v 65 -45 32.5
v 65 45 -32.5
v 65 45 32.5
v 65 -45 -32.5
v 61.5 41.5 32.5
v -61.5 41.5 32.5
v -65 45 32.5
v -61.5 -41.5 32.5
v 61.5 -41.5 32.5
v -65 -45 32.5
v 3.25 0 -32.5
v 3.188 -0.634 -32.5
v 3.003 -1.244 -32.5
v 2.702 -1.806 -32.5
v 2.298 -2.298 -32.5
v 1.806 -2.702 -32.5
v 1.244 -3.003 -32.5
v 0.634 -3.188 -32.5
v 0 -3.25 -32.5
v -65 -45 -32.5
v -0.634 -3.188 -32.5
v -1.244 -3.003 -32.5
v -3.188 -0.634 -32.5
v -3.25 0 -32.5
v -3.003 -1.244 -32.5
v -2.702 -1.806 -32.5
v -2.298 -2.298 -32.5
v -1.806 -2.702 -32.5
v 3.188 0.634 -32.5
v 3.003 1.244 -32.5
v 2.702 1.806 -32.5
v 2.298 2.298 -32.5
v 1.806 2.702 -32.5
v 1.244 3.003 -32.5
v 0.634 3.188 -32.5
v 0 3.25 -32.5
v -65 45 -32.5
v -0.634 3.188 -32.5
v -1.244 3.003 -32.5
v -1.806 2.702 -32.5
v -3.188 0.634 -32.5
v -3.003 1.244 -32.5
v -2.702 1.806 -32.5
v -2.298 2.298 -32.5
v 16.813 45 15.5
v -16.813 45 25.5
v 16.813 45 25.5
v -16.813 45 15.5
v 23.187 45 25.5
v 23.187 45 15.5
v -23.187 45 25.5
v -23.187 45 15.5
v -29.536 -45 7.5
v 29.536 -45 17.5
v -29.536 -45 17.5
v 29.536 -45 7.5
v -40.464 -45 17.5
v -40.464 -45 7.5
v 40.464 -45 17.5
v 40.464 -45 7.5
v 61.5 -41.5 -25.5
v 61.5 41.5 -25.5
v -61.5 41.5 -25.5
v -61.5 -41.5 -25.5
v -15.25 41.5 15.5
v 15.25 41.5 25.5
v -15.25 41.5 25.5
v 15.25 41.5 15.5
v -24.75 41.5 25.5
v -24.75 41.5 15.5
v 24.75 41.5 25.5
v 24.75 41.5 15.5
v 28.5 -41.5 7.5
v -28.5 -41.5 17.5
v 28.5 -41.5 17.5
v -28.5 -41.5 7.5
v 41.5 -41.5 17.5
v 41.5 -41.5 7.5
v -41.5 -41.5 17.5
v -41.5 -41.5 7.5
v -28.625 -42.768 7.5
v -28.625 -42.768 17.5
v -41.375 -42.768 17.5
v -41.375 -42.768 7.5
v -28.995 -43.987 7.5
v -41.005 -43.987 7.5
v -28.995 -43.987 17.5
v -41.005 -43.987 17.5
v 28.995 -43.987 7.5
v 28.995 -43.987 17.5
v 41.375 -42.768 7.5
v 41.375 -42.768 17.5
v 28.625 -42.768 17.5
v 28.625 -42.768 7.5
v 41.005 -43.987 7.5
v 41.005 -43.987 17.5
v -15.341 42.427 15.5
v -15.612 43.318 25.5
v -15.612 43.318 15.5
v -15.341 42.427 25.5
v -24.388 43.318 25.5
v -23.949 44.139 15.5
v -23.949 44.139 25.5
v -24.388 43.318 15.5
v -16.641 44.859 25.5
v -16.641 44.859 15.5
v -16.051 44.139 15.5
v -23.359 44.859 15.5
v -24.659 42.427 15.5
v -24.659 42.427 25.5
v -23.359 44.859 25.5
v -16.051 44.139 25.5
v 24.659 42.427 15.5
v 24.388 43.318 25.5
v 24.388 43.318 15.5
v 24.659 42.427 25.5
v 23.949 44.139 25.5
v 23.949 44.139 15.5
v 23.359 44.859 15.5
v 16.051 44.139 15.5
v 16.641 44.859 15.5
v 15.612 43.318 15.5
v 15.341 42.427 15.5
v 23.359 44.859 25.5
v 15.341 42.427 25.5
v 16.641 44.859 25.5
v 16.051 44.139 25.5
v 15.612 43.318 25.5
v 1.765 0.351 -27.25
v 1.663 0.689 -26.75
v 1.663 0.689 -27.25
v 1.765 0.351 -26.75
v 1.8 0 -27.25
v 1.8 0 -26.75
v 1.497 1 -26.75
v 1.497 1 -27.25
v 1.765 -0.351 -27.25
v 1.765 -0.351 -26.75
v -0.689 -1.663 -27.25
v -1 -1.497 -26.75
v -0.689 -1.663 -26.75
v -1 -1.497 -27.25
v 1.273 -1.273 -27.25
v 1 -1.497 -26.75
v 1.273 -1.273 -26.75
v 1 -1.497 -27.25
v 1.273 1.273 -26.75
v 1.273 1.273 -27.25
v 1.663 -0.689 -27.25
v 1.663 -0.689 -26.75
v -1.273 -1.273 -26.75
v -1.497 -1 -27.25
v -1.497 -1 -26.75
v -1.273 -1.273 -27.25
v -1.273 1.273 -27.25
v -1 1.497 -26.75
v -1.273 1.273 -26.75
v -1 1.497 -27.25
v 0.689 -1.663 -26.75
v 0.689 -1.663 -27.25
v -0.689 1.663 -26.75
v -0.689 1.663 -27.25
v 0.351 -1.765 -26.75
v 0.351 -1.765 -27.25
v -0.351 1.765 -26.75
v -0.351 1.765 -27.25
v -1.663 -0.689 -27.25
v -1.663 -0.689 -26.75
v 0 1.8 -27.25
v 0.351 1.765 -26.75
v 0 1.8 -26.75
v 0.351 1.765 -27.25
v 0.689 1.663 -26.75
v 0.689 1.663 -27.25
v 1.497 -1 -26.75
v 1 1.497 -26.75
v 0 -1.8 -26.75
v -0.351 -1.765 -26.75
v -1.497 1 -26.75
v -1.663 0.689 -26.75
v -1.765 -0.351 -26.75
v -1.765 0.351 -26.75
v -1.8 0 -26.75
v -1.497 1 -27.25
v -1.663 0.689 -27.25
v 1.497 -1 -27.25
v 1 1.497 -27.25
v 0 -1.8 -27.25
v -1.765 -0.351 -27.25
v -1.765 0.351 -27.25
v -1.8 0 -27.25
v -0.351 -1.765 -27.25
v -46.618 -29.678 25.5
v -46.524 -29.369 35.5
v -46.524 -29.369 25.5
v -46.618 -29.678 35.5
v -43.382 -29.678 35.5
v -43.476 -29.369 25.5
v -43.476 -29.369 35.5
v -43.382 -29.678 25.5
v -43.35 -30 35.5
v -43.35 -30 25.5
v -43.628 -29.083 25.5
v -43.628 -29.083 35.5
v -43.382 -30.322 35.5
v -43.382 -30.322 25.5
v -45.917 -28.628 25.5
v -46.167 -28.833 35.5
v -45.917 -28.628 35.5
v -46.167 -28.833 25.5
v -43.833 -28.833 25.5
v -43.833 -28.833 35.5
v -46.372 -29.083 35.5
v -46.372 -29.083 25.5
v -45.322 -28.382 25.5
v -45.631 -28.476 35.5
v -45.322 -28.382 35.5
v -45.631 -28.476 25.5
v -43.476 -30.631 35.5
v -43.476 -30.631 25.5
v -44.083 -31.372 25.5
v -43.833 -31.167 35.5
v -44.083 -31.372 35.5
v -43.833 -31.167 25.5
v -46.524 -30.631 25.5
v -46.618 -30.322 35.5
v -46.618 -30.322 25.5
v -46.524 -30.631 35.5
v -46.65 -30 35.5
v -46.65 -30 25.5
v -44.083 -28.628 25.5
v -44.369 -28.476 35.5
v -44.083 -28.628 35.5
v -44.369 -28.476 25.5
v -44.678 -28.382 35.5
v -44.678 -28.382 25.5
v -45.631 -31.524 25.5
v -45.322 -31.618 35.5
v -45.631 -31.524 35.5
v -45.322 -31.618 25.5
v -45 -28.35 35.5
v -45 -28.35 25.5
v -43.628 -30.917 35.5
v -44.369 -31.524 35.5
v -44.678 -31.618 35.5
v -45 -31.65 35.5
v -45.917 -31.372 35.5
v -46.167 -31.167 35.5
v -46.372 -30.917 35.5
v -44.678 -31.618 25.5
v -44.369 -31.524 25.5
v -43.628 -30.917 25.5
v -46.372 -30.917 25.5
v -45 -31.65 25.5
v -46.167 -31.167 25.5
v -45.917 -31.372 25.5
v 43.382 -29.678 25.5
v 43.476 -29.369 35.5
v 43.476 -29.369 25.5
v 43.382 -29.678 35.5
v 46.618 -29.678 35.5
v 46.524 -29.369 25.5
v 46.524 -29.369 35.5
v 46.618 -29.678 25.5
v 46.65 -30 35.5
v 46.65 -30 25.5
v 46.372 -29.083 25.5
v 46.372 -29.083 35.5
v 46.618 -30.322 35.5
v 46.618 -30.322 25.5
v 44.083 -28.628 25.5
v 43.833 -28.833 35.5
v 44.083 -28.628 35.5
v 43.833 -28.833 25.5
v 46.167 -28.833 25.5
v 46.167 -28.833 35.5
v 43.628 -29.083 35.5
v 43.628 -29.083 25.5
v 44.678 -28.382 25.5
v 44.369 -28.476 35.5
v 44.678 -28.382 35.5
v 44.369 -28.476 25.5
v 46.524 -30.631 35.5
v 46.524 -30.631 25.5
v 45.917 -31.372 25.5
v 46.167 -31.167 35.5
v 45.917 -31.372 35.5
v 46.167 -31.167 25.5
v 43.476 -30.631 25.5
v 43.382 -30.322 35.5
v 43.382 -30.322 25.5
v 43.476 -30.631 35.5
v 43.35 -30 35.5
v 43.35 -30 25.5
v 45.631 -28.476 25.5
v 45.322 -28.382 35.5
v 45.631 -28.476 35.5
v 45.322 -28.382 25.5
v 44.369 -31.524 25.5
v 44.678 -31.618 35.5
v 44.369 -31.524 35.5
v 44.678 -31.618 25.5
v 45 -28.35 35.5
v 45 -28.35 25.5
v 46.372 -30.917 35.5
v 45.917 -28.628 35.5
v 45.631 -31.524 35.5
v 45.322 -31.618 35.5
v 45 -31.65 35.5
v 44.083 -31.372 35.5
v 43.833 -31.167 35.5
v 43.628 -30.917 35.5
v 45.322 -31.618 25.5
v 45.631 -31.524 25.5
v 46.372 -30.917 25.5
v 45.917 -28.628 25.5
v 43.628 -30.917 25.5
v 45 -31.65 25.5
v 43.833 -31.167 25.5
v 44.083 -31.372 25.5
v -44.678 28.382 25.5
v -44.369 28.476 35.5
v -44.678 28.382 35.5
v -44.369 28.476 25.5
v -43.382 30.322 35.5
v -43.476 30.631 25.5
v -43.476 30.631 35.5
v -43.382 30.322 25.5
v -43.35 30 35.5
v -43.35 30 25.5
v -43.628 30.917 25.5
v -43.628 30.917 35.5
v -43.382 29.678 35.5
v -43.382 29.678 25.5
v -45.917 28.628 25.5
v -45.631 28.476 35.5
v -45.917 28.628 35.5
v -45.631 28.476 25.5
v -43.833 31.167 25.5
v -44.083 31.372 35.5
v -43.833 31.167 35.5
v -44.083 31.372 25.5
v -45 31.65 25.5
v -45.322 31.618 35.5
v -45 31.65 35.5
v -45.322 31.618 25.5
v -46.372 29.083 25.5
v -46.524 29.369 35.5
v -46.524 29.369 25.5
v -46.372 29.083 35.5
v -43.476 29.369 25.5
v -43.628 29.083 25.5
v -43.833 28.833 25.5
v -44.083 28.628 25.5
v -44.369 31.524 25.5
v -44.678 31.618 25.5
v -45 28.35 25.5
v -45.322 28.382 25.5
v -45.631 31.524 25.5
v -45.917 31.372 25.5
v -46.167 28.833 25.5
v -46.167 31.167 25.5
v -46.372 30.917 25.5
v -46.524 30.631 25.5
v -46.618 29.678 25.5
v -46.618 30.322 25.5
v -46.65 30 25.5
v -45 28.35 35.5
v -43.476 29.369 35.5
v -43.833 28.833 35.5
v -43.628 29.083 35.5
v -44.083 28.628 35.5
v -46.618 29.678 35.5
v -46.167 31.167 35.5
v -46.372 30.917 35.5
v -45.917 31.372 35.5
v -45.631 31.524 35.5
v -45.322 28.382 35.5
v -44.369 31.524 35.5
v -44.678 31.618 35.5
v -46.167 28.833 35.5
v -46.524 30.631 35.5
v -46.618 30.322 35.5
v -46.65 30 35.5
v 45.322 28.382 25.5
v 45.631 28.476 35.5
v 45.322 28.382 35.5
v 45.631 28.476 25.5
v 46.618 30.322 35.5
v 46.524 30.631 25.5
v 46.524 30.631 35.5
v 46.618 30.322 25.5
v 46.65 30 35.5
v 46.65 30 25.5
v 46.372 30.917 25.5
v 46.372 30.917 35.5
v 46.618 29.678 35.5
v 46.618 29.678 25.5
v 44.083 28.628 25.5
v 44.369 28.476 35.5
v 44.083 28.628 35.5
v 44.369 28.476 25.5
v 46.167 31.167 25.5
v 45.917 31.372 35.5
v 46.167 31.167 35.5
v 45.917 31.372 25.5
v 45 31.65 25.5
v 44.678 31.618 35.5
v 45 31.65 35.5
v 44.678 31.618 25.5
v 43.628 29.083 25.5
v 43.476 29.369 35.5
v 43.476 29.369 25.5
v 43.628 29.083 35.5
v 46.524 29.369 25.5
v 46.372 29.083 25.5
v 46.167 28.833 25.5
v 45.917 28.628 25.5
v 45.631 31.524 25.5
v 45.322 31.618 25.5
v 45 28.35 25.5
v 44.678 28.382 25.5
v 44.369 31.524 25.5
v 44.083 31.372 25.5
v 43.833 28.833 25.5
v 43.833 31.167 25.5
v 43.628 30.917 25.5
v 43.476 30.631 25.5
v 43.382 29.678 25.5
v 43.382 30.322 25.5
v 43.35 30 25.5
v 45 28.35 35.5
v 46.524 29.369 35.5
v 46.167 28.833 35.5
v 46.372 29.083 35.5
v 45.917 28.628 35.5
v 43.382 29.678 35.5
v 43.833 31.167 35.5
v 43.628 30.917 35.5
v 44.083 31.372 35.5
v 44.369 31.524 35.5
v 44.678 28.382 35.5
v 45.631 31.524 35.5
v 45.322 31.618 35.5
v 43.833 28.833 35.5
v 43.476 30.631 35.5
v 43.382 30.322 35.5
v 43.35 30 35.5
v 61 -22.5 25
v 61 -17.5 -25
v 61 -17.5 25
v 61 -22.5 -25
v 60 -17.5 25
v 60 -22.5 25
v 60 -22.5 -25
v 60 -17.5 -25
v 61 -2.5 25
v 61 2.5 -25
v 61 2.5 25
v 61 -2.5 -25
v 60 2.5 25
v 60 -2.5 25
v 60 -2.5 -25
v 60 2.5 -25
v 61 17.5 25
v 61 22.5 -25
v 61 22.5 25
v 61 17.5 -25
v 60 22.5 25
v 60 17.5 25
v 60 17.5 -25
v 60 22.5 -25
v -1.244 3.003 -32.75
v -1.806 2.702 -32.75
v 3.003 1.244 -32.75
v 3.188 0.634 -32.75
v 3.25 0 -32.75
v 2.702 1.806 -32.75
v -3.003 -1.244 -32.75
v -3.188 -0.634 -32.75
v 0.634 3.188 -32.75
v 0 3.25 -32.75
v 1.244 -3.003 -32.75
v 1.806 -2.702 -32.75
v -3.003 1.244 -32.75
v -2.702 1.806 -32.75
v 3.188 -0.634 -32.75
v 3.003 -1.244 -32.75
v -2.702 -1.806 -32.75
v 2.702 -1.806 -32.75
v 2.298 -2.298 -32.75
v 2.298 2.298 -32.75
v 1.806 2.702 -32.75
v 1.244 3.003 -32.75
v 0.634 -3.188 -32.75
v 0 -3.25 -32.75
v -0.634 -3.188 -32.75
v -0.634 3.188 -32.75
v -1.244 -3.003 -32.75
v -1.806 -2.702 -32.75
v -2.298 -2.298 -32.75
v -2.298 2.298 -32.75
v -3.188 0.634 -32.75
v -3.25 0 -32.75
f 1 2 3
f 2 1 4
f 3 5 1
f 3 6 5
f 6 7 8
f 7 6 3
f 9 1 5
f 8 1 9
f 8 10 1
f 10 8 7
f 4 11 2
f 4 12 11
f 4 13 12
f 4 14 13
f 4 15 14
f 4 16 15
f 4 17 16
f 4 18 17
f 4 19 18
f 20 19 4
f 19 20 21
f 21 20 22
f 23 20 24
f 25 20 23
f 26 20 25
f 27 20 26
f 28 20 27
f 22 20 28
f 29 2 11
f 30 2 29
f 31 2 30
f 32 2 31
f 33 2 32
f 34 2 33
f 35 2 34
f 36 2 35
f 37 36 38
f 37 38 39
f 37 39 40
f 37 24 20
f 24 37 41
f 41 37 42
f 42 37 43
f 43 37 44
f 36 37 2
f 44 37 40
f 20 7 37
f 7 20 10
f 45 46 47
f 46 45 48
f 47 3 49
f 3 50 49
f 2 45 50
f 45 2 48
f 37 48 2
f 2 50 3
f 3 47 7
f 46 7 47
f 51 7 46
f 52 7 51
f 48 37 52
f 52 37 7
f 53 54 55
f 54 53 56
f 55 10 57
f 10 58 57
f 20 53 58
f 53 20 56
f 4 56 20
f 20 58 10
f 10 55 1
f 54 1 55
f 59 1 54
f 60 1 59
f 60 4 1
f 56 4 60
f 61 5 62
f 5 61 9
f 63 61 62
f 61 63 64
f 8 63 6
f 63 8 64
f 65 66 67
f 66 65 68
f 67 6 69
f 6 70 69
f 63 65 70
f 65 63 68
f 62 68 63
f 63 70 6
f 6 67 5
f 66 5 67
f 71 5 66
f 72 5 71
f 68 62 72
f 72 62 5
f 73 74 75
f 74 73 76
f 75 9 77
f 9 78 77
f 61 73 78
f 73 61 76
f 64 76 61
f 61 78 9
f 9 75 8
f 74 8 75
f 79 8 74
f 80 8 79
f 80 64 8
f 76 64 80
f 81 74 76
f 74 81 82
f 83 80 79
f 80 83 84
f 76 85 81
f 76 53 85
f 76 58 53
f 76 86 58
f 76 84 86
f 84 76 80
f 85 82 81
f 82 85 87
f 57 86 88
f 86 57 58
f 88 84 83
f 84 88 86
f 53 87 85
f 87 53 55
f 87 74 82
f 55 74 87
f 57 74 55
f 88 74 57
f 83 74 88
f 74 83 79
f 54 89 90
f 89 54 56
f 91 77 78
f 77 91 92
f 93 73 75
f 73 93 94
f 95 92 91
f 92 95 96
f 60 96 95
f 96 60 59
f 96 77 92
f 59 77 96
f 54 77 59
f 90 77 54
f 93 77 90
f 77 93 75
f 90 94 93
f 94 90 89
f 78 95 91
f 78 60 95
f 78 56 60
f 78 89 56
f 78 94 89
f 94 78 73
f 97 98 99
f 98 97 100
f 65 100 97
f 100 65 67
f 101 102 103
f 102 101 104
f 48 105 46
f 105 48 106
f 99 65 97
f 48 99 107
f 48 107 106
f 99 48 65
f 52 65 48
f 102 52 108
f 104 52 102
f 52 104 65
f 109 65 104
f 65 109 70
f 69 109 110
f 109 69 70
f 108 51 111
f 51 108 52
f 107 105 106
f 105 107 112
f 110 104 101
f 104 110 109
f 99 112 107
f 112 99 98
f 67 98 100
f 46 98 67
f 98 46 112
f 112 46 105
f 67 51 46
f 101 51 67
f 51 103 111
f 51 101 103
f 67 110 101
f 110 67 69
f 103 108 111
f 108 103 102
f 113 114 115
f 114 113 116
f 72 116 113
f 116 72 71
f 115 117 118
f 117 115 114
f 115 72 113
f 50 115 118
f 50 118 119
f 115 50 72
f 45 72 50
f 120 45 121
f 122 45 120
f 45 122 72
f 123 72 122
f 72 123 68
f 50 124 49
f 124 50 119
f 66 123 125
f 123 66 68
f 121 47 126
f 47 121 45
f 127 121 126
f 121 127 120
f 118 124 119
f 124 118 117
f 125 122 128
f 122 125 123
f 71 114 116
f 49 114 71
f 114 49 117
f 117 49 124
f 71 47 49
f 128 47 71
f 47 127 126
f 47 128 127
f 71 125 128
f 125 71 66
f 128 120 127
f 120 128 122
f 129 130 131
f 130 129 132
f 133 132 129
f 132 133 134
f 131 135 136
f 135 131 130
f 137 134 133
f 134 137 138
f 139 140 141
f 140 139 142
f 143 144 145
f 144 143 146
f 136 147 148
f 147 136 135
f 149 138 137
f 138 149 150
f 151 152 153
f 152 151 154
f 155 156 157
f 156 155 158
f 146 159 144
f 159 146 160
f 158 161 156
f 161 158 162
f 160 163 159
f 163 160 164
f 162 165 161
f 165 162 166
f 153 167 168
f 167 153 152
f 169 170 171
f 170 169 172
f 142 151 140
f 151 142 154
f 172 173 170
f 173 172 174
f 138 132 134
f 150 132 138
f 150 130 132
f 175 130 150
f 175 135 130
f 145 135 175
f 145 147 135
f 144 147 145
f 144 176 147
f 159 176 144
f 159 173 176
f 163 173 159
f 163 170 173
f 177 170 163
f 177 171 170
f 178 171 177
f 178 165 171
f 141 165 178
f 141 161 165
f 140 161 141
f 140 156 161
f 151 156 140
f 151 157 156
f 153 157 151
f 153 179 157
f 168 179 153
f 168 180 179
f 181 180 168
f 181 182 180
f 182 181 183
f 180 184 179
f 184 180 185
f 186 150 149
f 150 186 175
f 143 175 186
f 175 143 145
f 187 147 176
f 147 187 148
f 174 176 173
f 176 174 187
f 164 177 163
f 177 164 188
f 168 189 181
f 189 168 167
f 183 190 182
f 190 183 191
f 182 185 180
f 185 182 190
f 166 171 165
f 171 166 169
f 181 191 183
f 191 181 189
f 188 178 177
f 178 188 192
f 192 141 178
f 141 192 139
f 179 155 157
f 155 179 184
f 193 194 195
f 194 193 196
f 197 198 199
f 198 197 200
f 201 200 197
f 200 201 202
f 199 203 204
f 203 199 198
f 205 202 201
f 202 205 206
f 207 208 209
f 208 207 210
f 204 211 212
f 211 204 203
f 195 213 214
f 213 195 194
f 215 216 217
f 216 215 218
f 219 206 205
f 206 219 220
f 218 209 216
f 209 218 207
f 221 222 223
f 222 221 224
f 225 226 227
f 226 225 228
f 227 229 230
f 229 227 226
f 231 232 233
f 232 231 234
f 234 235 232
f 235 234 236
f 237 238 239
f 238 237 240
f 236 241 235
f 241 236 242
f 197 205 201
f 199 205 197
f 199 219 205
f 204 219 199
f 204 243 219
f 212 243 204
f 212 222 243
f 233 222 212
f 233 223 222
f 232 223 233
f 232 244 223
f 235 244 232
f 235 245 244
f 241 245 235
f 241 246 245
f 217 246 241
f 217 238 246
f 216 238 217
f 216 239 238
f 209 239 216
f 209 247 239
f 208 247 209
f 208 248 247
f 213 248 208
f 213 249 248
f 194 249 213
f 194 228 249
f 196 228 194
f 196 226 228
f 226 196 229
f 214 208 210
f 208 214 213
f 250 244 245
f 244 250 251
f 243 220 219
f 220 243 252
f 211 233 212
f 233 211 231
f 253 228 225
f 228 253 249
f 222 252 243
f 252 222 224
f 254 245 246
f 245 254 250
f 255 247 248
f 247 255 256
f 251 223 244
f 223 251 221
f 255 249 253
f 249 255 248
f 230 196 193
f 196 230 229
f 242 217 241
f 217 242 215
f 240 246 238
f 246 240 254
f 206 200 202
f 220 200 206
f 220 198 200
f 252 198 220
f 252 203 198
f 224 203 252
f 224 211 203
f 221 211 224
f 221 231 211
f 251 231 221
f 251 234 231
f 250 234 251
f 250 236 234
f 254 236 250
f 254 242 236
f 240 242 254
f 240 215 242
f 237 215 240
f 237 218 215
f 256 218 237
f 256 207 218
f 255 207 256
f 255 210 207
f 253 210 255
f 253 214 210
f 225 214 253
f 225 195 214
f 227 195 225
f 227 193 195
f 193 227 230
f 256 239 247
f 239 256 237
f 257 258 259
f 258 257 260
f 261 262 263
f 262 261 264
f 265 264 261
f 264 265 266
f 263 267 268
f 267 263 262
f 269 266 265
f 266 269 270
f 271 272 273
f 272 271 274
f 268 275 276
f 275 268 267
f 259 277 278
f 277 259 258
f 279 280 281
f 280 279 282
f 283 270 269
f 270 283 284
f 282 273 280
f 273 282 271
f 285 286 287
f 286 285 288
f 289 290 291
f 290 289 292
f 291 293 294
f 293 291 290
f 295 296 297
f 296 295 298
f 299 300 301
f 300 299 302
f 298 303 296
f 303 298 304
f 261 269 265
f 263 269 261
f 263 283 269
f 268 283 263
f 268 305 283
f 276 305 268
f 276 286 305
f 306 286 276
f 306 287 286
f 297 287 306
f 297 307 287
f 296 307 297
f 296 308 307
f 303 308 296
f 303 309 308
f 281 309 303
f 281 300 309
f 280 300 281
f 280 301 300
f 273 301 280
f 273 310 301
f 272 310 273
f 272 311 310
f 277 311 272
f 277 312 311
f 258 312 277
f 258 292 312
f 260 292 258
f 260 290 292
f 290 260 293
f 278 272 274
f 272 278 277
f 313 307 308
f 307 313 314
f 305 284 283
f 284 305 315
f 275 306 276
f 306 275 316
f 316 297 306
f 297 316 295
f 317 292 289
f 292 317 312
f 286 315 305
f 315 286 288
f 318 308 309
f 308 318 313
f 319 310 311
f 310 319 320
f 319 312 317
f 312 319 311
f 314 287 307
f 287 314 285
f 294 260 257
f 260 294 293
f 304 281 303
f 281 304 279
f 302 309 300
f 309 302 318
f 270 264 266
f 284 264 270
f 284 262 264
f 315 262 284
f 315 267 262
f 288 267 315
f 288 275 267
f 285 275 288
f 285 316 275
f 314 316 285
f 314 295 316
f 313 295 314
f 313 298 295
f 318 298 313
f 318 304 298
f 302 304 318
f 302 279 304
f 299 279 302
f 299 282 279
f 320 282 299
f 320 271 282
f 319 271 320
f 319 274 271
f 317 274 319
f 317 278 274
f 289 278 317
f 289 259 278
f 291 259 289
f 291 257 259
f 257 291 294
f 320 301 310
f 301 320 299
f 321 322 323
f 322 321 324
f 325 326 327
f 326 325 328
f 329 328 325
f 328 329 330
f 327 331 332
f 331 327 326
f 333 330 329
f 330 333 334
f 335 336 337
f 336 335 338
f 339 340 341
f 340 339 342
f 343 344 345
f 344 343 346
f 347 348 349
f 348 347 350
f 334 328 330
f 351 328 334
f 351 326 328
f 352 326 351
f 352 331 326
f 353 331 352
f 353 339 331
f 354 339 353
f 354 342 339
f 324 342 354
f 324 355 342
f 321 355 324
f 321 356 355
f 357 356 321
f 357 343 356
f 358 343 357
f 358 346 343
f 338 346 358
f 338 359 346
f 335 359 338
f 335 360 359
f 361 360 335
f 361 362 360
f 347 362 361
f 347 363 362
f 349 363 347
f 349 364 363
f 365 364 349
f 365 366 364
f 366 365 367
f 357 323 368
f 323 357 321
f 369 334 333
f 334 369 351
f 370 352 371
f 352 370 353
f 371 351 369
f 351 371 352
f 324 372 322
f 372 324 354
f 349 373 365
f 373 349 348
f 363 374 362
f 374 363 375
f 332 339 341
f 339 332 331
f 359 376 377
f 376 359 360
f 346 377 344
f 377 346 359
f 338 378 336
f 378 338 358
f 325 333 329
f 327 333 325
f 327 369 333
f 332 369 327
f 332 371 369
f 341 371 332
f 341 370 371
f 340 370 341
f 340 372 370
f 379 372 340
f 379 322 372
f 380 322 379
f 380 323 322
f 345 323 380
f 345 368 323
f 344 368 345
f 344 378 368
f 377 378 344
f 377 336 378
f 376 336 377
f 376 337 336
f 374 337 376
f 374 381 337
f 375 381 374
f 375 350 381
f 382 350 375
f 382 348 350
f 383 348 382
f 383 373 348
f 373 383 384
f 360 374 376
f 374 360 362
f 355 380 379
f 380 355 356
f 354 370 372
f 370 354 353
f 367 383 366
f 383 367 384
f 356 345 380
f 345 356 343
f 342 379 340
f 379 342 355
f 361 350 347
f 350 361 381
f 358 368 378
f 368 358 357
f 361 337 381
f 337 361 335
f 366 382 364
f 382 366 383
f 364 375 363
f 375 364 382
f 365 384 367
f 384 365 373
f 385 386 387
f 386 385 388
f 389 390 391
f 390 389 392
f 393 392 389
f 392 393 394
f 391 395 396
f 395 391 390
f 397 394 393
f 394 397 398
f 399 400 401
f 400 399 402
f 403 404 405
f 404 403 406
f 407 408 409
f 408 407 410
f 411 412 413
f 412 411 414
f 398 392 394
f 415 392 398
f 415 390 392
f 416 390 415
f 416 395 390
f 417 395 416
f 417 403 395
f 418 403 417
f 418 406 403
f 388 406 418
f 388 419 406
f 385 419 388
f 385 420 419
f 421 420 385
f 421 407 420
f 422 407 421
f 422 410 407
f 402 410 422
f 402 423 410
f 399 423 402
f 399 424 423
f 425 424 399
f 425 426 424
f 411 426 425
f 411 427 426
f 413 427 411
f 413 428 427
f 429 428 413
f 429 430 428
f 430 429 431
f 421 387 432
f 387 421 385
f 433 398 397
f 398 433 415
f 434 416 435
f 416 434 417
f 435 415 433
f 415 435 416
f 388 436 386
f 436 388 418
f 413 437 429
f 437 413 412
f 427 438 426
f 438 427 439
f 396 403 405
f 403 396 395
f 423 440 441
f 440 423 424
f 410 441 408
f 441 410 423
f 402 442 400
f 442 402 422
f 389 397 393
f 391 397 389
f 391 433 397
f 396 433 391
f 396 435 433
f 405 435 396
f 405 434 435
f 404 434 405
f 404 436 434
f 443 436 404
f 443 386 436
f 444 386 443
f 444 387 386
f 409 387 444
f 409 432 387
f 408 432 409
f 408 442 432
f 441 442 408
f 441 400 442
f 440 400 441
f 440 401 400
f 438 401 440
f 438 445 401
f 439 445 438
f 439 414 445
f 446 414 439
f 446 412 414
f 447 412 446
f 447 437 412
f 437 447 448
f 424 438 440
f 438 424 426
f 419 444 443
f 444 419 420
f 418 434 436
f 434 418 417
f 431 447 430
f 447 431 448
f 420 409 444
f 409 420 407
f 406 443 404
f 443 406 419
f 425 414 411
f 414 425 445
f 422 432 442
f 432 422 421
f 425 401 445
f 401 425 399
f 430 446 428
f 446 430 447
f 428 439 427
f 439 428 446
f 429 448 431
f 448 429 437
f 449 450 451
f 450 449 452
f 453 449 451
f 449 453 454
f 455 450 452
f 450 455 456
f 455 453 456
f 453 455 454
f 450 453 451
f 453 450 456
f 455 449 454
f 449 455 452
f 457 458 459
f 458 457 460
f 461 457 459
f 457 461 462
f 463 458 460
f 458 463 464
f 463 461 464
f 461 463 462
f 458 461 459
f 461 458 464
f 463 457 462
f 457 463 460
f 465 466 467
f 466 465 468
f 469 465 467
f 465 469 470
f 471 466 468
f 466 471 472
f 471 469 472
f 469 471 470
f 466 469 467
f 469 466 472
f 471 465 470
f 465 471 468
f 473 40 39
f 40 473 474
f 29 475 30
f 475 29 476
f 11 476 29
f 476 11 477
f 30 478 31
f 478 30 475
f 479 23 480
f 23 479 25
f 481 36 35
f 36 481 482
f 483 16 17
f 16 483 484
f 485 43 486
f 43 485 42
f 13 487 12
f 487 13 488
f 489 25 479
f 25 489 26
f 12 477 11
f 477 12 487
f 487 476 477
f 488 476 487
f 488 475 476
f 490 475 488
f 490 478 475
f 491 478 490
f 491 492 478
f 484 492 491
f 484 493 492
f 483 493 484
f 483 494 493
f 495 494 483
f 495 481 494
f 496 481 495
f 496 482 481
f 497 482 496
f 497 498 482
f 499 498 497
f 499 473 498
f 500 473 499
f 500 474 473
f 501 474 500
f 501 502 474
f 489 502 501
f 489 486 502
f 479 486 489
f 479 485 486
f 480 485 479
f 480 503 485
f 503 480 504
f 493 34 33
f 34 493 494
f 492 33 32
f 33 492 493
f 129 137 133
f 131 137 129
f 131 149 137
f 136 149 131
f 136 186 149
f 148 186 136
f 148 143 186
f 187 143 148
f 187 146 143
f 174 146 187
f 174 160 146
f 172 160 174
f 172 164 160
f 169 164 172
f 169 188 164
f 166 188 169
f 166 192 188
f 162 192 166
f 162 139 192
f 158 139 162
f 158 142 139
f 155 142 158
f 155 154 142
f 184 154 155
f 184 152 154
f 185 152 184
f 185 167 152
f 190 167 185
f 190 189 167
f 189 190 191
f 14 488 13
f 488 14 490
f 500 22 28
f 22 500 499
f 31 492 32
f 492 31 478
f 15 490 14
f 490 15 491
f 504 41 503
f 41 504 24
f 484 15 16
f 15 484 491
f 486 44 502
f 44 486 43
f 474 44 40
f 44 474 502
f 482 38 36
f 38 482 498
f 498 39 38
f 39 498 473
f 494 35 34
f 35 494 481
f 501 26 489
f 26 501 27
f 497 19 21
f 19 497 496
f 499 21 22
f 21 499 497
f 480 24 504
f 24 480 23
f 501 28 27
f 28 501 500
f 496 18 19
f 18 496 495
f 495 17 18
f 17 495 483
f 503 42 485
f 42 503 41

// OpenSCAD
// UNIVERSAL BALUN/UNUN ENCLOSURE — FDM 3D-PRINTABLE
// Purpose: Large, general-purpose enclosure for all balun types
// Dimensions: 130×90×65 mm (largest design, supports stacked cores)
// Features: 2× SO-239 + 2× BNC feedthroughs, 4-bolt lid, 1/4"-20 pole mount
// Material: PETG or ABS recommended
// Print time: ~6–8 hours
// Filament: ~70–100 grams

$fn = 32;

// External dimensions
box_l = 130;
box_w = 90;
box_h = 65;
wall = 3.5;

// Internal cavity
cav_l = box_l - 2*wall;
cav_w = box_w - 2*wall;
cav_h = box_h - 2*wall;

// Connector specifications
so239_hole = 13.0;
bnc_hole = 9.5;

// Lid mounting bolts (M3 corner bolts)
bolt_hole = 3.3;
bolt_inset = 10;

// Pole mount (1/4"-20 TPI = 1.27mm pitch, OD ~6.35mm)
pole_hole = 6.5;

module base_box() {
    difference() {
        // Outer envelope
        cube([box_l, box_w, box_h], center=true);

        // Internal cavity
        translate([0, 0, wall])
            cube([cav_l, cav_w, cav_h], center=true);

        // SO-239 holes (left and right sides)
        translate([-35, -box_w/2 + wall, box_h/2 - 20])
            cylinder(h=10, r=so239_hole/2, center=true);
        translate([35, -box_w/2 + wall, box_h/2 - 20])
            cylinder(h=10, r=so239_hole/2, center=true);

        // BNC holes (back side, upper)
        translate([-20, box_w/2 - wall, box_h/2 - 12])
            cylinder(h=10, r=bnc_hole/2, center=true);
        translate([20, box_w/2 - wall, box_h/2 - 12])
            cylinder(h=10, r=bnc_hole/2, center=true);

        // Drain hole (bottom center)
        translate([0, 0, -box_h/2 + wall])
            cylinder(h=wall+1, r=1.8, center=true);
    }
}

module corner_bolt_holes() {
    // M3 bolt holes for 4-bolt lid retention
    corners = [[-45, -30], [45, -30], [-45, 30], [45, 30]];
    for(c=corners) {
        translate([c[0], c[1], box_h/2 - 2])
            cylinder(h=10, r=bolt_hole/2, center=true);
    }
}

module pole_mount_hole() {
    // 1/4"-20 TPI threaded insert hole (bottom center)
    translate([0, 0, -box_h/2 + wall - 1])
        cylinder(h=wall+2, r=pole_hole/2, center=true);
}

module ventilation_grooves() {
    // Heat dissipation grooves (sides of box)
    for(i=[-20, 0, 20]) {
        translate([box_l/2 - wall - 1, i, 0])
            cube([1, 5, 50], center=true);
    }
}

module lid() {
    difference() {
        // Lid plate (bolt-down design)
        cube([box_l - 2*wall - 4, box_w - 2*wall - 4, 4], center=true);

        // Counter-sinks for M3 bolt heads (cone-shaped)
        corners = [[-40, -25], [40, -25], [-40, 25], [40, 25]];
        for(c=corners) {
            translate([c[0], c[1], 1.5])
                cylinder(h=3, r1=5, r2=3, center=true);
        }

        // Large cavity for components/potting
        translate([0, 0, 0])
            cube([box_l - 2*wall - 8, box_w - 2*wall - 8, 2.5], center=true);
    }
}

// MAIN ASSEMBLY
base_box();
corner_bolt_holes();
pole_mount_hole();
ventilation_grooves();

// Uncomment to show lid:
// translate([0, 0, box_h/2 + 4])
//     lid();

// PRINTING & ASSEMBLY INSTRUCTIONS:
// 1. Print base (standard orientation)
// 2. Print lid separately
// 3. Installation (mixed connectors example):
//    - Left SO-239: Input (50Ω from coax feedline)
//    - Right SO-239: Output (50Ω to tuner or antenna coupler)
//    - Back BNC: Optional secondary connection
//    - Pole mount: Bottom threaded insert (for mast attachment)
// 4. Internal component placement:
//    - FT-240-43 core (or stacked FT-240-43×2) center bottom
//    - Wire routing: Keep separation between primary/secondary
//    - Potting: Optional (allows tight thermal coupling)
// 5. Lid assembly:
//    - Place 4× M3 stainless bolts in corner holes
//    - Ensure gasket/O-ring positioned (if using)
//    - Tighten evenly (finger-tight + 1/4 turn)
// 6. Weatherproofing:
//    - Paint exterior (2-part polyurethane or epoxy coating)
//    - Silicone caulk around lid gasket
//    - Grease bolt threads (prevents corrosion)

// CUSTOMIZATION OPTIONS:
// 1. Change connector types:
//    - Replace SO-239 holes with N-connector (larger diameter)
//    - Replace BNC with SMA (for UHF/microwave)
// 2. Add potting provisions:
//    - Increase internal height (box_h = 75)
//    - Add overflow slot (prevents air bubbles)
// 3. Thermal management:
//    - Add cooling fins to exterior
//    - Increase ventilation grooves
// 4. High-power variant:
//    - Increase wall thickness (wall = 5)
//    - Add aluminum backing plate (heat sink)
//    - Use copper potting compound (improves thermal conductivity)
